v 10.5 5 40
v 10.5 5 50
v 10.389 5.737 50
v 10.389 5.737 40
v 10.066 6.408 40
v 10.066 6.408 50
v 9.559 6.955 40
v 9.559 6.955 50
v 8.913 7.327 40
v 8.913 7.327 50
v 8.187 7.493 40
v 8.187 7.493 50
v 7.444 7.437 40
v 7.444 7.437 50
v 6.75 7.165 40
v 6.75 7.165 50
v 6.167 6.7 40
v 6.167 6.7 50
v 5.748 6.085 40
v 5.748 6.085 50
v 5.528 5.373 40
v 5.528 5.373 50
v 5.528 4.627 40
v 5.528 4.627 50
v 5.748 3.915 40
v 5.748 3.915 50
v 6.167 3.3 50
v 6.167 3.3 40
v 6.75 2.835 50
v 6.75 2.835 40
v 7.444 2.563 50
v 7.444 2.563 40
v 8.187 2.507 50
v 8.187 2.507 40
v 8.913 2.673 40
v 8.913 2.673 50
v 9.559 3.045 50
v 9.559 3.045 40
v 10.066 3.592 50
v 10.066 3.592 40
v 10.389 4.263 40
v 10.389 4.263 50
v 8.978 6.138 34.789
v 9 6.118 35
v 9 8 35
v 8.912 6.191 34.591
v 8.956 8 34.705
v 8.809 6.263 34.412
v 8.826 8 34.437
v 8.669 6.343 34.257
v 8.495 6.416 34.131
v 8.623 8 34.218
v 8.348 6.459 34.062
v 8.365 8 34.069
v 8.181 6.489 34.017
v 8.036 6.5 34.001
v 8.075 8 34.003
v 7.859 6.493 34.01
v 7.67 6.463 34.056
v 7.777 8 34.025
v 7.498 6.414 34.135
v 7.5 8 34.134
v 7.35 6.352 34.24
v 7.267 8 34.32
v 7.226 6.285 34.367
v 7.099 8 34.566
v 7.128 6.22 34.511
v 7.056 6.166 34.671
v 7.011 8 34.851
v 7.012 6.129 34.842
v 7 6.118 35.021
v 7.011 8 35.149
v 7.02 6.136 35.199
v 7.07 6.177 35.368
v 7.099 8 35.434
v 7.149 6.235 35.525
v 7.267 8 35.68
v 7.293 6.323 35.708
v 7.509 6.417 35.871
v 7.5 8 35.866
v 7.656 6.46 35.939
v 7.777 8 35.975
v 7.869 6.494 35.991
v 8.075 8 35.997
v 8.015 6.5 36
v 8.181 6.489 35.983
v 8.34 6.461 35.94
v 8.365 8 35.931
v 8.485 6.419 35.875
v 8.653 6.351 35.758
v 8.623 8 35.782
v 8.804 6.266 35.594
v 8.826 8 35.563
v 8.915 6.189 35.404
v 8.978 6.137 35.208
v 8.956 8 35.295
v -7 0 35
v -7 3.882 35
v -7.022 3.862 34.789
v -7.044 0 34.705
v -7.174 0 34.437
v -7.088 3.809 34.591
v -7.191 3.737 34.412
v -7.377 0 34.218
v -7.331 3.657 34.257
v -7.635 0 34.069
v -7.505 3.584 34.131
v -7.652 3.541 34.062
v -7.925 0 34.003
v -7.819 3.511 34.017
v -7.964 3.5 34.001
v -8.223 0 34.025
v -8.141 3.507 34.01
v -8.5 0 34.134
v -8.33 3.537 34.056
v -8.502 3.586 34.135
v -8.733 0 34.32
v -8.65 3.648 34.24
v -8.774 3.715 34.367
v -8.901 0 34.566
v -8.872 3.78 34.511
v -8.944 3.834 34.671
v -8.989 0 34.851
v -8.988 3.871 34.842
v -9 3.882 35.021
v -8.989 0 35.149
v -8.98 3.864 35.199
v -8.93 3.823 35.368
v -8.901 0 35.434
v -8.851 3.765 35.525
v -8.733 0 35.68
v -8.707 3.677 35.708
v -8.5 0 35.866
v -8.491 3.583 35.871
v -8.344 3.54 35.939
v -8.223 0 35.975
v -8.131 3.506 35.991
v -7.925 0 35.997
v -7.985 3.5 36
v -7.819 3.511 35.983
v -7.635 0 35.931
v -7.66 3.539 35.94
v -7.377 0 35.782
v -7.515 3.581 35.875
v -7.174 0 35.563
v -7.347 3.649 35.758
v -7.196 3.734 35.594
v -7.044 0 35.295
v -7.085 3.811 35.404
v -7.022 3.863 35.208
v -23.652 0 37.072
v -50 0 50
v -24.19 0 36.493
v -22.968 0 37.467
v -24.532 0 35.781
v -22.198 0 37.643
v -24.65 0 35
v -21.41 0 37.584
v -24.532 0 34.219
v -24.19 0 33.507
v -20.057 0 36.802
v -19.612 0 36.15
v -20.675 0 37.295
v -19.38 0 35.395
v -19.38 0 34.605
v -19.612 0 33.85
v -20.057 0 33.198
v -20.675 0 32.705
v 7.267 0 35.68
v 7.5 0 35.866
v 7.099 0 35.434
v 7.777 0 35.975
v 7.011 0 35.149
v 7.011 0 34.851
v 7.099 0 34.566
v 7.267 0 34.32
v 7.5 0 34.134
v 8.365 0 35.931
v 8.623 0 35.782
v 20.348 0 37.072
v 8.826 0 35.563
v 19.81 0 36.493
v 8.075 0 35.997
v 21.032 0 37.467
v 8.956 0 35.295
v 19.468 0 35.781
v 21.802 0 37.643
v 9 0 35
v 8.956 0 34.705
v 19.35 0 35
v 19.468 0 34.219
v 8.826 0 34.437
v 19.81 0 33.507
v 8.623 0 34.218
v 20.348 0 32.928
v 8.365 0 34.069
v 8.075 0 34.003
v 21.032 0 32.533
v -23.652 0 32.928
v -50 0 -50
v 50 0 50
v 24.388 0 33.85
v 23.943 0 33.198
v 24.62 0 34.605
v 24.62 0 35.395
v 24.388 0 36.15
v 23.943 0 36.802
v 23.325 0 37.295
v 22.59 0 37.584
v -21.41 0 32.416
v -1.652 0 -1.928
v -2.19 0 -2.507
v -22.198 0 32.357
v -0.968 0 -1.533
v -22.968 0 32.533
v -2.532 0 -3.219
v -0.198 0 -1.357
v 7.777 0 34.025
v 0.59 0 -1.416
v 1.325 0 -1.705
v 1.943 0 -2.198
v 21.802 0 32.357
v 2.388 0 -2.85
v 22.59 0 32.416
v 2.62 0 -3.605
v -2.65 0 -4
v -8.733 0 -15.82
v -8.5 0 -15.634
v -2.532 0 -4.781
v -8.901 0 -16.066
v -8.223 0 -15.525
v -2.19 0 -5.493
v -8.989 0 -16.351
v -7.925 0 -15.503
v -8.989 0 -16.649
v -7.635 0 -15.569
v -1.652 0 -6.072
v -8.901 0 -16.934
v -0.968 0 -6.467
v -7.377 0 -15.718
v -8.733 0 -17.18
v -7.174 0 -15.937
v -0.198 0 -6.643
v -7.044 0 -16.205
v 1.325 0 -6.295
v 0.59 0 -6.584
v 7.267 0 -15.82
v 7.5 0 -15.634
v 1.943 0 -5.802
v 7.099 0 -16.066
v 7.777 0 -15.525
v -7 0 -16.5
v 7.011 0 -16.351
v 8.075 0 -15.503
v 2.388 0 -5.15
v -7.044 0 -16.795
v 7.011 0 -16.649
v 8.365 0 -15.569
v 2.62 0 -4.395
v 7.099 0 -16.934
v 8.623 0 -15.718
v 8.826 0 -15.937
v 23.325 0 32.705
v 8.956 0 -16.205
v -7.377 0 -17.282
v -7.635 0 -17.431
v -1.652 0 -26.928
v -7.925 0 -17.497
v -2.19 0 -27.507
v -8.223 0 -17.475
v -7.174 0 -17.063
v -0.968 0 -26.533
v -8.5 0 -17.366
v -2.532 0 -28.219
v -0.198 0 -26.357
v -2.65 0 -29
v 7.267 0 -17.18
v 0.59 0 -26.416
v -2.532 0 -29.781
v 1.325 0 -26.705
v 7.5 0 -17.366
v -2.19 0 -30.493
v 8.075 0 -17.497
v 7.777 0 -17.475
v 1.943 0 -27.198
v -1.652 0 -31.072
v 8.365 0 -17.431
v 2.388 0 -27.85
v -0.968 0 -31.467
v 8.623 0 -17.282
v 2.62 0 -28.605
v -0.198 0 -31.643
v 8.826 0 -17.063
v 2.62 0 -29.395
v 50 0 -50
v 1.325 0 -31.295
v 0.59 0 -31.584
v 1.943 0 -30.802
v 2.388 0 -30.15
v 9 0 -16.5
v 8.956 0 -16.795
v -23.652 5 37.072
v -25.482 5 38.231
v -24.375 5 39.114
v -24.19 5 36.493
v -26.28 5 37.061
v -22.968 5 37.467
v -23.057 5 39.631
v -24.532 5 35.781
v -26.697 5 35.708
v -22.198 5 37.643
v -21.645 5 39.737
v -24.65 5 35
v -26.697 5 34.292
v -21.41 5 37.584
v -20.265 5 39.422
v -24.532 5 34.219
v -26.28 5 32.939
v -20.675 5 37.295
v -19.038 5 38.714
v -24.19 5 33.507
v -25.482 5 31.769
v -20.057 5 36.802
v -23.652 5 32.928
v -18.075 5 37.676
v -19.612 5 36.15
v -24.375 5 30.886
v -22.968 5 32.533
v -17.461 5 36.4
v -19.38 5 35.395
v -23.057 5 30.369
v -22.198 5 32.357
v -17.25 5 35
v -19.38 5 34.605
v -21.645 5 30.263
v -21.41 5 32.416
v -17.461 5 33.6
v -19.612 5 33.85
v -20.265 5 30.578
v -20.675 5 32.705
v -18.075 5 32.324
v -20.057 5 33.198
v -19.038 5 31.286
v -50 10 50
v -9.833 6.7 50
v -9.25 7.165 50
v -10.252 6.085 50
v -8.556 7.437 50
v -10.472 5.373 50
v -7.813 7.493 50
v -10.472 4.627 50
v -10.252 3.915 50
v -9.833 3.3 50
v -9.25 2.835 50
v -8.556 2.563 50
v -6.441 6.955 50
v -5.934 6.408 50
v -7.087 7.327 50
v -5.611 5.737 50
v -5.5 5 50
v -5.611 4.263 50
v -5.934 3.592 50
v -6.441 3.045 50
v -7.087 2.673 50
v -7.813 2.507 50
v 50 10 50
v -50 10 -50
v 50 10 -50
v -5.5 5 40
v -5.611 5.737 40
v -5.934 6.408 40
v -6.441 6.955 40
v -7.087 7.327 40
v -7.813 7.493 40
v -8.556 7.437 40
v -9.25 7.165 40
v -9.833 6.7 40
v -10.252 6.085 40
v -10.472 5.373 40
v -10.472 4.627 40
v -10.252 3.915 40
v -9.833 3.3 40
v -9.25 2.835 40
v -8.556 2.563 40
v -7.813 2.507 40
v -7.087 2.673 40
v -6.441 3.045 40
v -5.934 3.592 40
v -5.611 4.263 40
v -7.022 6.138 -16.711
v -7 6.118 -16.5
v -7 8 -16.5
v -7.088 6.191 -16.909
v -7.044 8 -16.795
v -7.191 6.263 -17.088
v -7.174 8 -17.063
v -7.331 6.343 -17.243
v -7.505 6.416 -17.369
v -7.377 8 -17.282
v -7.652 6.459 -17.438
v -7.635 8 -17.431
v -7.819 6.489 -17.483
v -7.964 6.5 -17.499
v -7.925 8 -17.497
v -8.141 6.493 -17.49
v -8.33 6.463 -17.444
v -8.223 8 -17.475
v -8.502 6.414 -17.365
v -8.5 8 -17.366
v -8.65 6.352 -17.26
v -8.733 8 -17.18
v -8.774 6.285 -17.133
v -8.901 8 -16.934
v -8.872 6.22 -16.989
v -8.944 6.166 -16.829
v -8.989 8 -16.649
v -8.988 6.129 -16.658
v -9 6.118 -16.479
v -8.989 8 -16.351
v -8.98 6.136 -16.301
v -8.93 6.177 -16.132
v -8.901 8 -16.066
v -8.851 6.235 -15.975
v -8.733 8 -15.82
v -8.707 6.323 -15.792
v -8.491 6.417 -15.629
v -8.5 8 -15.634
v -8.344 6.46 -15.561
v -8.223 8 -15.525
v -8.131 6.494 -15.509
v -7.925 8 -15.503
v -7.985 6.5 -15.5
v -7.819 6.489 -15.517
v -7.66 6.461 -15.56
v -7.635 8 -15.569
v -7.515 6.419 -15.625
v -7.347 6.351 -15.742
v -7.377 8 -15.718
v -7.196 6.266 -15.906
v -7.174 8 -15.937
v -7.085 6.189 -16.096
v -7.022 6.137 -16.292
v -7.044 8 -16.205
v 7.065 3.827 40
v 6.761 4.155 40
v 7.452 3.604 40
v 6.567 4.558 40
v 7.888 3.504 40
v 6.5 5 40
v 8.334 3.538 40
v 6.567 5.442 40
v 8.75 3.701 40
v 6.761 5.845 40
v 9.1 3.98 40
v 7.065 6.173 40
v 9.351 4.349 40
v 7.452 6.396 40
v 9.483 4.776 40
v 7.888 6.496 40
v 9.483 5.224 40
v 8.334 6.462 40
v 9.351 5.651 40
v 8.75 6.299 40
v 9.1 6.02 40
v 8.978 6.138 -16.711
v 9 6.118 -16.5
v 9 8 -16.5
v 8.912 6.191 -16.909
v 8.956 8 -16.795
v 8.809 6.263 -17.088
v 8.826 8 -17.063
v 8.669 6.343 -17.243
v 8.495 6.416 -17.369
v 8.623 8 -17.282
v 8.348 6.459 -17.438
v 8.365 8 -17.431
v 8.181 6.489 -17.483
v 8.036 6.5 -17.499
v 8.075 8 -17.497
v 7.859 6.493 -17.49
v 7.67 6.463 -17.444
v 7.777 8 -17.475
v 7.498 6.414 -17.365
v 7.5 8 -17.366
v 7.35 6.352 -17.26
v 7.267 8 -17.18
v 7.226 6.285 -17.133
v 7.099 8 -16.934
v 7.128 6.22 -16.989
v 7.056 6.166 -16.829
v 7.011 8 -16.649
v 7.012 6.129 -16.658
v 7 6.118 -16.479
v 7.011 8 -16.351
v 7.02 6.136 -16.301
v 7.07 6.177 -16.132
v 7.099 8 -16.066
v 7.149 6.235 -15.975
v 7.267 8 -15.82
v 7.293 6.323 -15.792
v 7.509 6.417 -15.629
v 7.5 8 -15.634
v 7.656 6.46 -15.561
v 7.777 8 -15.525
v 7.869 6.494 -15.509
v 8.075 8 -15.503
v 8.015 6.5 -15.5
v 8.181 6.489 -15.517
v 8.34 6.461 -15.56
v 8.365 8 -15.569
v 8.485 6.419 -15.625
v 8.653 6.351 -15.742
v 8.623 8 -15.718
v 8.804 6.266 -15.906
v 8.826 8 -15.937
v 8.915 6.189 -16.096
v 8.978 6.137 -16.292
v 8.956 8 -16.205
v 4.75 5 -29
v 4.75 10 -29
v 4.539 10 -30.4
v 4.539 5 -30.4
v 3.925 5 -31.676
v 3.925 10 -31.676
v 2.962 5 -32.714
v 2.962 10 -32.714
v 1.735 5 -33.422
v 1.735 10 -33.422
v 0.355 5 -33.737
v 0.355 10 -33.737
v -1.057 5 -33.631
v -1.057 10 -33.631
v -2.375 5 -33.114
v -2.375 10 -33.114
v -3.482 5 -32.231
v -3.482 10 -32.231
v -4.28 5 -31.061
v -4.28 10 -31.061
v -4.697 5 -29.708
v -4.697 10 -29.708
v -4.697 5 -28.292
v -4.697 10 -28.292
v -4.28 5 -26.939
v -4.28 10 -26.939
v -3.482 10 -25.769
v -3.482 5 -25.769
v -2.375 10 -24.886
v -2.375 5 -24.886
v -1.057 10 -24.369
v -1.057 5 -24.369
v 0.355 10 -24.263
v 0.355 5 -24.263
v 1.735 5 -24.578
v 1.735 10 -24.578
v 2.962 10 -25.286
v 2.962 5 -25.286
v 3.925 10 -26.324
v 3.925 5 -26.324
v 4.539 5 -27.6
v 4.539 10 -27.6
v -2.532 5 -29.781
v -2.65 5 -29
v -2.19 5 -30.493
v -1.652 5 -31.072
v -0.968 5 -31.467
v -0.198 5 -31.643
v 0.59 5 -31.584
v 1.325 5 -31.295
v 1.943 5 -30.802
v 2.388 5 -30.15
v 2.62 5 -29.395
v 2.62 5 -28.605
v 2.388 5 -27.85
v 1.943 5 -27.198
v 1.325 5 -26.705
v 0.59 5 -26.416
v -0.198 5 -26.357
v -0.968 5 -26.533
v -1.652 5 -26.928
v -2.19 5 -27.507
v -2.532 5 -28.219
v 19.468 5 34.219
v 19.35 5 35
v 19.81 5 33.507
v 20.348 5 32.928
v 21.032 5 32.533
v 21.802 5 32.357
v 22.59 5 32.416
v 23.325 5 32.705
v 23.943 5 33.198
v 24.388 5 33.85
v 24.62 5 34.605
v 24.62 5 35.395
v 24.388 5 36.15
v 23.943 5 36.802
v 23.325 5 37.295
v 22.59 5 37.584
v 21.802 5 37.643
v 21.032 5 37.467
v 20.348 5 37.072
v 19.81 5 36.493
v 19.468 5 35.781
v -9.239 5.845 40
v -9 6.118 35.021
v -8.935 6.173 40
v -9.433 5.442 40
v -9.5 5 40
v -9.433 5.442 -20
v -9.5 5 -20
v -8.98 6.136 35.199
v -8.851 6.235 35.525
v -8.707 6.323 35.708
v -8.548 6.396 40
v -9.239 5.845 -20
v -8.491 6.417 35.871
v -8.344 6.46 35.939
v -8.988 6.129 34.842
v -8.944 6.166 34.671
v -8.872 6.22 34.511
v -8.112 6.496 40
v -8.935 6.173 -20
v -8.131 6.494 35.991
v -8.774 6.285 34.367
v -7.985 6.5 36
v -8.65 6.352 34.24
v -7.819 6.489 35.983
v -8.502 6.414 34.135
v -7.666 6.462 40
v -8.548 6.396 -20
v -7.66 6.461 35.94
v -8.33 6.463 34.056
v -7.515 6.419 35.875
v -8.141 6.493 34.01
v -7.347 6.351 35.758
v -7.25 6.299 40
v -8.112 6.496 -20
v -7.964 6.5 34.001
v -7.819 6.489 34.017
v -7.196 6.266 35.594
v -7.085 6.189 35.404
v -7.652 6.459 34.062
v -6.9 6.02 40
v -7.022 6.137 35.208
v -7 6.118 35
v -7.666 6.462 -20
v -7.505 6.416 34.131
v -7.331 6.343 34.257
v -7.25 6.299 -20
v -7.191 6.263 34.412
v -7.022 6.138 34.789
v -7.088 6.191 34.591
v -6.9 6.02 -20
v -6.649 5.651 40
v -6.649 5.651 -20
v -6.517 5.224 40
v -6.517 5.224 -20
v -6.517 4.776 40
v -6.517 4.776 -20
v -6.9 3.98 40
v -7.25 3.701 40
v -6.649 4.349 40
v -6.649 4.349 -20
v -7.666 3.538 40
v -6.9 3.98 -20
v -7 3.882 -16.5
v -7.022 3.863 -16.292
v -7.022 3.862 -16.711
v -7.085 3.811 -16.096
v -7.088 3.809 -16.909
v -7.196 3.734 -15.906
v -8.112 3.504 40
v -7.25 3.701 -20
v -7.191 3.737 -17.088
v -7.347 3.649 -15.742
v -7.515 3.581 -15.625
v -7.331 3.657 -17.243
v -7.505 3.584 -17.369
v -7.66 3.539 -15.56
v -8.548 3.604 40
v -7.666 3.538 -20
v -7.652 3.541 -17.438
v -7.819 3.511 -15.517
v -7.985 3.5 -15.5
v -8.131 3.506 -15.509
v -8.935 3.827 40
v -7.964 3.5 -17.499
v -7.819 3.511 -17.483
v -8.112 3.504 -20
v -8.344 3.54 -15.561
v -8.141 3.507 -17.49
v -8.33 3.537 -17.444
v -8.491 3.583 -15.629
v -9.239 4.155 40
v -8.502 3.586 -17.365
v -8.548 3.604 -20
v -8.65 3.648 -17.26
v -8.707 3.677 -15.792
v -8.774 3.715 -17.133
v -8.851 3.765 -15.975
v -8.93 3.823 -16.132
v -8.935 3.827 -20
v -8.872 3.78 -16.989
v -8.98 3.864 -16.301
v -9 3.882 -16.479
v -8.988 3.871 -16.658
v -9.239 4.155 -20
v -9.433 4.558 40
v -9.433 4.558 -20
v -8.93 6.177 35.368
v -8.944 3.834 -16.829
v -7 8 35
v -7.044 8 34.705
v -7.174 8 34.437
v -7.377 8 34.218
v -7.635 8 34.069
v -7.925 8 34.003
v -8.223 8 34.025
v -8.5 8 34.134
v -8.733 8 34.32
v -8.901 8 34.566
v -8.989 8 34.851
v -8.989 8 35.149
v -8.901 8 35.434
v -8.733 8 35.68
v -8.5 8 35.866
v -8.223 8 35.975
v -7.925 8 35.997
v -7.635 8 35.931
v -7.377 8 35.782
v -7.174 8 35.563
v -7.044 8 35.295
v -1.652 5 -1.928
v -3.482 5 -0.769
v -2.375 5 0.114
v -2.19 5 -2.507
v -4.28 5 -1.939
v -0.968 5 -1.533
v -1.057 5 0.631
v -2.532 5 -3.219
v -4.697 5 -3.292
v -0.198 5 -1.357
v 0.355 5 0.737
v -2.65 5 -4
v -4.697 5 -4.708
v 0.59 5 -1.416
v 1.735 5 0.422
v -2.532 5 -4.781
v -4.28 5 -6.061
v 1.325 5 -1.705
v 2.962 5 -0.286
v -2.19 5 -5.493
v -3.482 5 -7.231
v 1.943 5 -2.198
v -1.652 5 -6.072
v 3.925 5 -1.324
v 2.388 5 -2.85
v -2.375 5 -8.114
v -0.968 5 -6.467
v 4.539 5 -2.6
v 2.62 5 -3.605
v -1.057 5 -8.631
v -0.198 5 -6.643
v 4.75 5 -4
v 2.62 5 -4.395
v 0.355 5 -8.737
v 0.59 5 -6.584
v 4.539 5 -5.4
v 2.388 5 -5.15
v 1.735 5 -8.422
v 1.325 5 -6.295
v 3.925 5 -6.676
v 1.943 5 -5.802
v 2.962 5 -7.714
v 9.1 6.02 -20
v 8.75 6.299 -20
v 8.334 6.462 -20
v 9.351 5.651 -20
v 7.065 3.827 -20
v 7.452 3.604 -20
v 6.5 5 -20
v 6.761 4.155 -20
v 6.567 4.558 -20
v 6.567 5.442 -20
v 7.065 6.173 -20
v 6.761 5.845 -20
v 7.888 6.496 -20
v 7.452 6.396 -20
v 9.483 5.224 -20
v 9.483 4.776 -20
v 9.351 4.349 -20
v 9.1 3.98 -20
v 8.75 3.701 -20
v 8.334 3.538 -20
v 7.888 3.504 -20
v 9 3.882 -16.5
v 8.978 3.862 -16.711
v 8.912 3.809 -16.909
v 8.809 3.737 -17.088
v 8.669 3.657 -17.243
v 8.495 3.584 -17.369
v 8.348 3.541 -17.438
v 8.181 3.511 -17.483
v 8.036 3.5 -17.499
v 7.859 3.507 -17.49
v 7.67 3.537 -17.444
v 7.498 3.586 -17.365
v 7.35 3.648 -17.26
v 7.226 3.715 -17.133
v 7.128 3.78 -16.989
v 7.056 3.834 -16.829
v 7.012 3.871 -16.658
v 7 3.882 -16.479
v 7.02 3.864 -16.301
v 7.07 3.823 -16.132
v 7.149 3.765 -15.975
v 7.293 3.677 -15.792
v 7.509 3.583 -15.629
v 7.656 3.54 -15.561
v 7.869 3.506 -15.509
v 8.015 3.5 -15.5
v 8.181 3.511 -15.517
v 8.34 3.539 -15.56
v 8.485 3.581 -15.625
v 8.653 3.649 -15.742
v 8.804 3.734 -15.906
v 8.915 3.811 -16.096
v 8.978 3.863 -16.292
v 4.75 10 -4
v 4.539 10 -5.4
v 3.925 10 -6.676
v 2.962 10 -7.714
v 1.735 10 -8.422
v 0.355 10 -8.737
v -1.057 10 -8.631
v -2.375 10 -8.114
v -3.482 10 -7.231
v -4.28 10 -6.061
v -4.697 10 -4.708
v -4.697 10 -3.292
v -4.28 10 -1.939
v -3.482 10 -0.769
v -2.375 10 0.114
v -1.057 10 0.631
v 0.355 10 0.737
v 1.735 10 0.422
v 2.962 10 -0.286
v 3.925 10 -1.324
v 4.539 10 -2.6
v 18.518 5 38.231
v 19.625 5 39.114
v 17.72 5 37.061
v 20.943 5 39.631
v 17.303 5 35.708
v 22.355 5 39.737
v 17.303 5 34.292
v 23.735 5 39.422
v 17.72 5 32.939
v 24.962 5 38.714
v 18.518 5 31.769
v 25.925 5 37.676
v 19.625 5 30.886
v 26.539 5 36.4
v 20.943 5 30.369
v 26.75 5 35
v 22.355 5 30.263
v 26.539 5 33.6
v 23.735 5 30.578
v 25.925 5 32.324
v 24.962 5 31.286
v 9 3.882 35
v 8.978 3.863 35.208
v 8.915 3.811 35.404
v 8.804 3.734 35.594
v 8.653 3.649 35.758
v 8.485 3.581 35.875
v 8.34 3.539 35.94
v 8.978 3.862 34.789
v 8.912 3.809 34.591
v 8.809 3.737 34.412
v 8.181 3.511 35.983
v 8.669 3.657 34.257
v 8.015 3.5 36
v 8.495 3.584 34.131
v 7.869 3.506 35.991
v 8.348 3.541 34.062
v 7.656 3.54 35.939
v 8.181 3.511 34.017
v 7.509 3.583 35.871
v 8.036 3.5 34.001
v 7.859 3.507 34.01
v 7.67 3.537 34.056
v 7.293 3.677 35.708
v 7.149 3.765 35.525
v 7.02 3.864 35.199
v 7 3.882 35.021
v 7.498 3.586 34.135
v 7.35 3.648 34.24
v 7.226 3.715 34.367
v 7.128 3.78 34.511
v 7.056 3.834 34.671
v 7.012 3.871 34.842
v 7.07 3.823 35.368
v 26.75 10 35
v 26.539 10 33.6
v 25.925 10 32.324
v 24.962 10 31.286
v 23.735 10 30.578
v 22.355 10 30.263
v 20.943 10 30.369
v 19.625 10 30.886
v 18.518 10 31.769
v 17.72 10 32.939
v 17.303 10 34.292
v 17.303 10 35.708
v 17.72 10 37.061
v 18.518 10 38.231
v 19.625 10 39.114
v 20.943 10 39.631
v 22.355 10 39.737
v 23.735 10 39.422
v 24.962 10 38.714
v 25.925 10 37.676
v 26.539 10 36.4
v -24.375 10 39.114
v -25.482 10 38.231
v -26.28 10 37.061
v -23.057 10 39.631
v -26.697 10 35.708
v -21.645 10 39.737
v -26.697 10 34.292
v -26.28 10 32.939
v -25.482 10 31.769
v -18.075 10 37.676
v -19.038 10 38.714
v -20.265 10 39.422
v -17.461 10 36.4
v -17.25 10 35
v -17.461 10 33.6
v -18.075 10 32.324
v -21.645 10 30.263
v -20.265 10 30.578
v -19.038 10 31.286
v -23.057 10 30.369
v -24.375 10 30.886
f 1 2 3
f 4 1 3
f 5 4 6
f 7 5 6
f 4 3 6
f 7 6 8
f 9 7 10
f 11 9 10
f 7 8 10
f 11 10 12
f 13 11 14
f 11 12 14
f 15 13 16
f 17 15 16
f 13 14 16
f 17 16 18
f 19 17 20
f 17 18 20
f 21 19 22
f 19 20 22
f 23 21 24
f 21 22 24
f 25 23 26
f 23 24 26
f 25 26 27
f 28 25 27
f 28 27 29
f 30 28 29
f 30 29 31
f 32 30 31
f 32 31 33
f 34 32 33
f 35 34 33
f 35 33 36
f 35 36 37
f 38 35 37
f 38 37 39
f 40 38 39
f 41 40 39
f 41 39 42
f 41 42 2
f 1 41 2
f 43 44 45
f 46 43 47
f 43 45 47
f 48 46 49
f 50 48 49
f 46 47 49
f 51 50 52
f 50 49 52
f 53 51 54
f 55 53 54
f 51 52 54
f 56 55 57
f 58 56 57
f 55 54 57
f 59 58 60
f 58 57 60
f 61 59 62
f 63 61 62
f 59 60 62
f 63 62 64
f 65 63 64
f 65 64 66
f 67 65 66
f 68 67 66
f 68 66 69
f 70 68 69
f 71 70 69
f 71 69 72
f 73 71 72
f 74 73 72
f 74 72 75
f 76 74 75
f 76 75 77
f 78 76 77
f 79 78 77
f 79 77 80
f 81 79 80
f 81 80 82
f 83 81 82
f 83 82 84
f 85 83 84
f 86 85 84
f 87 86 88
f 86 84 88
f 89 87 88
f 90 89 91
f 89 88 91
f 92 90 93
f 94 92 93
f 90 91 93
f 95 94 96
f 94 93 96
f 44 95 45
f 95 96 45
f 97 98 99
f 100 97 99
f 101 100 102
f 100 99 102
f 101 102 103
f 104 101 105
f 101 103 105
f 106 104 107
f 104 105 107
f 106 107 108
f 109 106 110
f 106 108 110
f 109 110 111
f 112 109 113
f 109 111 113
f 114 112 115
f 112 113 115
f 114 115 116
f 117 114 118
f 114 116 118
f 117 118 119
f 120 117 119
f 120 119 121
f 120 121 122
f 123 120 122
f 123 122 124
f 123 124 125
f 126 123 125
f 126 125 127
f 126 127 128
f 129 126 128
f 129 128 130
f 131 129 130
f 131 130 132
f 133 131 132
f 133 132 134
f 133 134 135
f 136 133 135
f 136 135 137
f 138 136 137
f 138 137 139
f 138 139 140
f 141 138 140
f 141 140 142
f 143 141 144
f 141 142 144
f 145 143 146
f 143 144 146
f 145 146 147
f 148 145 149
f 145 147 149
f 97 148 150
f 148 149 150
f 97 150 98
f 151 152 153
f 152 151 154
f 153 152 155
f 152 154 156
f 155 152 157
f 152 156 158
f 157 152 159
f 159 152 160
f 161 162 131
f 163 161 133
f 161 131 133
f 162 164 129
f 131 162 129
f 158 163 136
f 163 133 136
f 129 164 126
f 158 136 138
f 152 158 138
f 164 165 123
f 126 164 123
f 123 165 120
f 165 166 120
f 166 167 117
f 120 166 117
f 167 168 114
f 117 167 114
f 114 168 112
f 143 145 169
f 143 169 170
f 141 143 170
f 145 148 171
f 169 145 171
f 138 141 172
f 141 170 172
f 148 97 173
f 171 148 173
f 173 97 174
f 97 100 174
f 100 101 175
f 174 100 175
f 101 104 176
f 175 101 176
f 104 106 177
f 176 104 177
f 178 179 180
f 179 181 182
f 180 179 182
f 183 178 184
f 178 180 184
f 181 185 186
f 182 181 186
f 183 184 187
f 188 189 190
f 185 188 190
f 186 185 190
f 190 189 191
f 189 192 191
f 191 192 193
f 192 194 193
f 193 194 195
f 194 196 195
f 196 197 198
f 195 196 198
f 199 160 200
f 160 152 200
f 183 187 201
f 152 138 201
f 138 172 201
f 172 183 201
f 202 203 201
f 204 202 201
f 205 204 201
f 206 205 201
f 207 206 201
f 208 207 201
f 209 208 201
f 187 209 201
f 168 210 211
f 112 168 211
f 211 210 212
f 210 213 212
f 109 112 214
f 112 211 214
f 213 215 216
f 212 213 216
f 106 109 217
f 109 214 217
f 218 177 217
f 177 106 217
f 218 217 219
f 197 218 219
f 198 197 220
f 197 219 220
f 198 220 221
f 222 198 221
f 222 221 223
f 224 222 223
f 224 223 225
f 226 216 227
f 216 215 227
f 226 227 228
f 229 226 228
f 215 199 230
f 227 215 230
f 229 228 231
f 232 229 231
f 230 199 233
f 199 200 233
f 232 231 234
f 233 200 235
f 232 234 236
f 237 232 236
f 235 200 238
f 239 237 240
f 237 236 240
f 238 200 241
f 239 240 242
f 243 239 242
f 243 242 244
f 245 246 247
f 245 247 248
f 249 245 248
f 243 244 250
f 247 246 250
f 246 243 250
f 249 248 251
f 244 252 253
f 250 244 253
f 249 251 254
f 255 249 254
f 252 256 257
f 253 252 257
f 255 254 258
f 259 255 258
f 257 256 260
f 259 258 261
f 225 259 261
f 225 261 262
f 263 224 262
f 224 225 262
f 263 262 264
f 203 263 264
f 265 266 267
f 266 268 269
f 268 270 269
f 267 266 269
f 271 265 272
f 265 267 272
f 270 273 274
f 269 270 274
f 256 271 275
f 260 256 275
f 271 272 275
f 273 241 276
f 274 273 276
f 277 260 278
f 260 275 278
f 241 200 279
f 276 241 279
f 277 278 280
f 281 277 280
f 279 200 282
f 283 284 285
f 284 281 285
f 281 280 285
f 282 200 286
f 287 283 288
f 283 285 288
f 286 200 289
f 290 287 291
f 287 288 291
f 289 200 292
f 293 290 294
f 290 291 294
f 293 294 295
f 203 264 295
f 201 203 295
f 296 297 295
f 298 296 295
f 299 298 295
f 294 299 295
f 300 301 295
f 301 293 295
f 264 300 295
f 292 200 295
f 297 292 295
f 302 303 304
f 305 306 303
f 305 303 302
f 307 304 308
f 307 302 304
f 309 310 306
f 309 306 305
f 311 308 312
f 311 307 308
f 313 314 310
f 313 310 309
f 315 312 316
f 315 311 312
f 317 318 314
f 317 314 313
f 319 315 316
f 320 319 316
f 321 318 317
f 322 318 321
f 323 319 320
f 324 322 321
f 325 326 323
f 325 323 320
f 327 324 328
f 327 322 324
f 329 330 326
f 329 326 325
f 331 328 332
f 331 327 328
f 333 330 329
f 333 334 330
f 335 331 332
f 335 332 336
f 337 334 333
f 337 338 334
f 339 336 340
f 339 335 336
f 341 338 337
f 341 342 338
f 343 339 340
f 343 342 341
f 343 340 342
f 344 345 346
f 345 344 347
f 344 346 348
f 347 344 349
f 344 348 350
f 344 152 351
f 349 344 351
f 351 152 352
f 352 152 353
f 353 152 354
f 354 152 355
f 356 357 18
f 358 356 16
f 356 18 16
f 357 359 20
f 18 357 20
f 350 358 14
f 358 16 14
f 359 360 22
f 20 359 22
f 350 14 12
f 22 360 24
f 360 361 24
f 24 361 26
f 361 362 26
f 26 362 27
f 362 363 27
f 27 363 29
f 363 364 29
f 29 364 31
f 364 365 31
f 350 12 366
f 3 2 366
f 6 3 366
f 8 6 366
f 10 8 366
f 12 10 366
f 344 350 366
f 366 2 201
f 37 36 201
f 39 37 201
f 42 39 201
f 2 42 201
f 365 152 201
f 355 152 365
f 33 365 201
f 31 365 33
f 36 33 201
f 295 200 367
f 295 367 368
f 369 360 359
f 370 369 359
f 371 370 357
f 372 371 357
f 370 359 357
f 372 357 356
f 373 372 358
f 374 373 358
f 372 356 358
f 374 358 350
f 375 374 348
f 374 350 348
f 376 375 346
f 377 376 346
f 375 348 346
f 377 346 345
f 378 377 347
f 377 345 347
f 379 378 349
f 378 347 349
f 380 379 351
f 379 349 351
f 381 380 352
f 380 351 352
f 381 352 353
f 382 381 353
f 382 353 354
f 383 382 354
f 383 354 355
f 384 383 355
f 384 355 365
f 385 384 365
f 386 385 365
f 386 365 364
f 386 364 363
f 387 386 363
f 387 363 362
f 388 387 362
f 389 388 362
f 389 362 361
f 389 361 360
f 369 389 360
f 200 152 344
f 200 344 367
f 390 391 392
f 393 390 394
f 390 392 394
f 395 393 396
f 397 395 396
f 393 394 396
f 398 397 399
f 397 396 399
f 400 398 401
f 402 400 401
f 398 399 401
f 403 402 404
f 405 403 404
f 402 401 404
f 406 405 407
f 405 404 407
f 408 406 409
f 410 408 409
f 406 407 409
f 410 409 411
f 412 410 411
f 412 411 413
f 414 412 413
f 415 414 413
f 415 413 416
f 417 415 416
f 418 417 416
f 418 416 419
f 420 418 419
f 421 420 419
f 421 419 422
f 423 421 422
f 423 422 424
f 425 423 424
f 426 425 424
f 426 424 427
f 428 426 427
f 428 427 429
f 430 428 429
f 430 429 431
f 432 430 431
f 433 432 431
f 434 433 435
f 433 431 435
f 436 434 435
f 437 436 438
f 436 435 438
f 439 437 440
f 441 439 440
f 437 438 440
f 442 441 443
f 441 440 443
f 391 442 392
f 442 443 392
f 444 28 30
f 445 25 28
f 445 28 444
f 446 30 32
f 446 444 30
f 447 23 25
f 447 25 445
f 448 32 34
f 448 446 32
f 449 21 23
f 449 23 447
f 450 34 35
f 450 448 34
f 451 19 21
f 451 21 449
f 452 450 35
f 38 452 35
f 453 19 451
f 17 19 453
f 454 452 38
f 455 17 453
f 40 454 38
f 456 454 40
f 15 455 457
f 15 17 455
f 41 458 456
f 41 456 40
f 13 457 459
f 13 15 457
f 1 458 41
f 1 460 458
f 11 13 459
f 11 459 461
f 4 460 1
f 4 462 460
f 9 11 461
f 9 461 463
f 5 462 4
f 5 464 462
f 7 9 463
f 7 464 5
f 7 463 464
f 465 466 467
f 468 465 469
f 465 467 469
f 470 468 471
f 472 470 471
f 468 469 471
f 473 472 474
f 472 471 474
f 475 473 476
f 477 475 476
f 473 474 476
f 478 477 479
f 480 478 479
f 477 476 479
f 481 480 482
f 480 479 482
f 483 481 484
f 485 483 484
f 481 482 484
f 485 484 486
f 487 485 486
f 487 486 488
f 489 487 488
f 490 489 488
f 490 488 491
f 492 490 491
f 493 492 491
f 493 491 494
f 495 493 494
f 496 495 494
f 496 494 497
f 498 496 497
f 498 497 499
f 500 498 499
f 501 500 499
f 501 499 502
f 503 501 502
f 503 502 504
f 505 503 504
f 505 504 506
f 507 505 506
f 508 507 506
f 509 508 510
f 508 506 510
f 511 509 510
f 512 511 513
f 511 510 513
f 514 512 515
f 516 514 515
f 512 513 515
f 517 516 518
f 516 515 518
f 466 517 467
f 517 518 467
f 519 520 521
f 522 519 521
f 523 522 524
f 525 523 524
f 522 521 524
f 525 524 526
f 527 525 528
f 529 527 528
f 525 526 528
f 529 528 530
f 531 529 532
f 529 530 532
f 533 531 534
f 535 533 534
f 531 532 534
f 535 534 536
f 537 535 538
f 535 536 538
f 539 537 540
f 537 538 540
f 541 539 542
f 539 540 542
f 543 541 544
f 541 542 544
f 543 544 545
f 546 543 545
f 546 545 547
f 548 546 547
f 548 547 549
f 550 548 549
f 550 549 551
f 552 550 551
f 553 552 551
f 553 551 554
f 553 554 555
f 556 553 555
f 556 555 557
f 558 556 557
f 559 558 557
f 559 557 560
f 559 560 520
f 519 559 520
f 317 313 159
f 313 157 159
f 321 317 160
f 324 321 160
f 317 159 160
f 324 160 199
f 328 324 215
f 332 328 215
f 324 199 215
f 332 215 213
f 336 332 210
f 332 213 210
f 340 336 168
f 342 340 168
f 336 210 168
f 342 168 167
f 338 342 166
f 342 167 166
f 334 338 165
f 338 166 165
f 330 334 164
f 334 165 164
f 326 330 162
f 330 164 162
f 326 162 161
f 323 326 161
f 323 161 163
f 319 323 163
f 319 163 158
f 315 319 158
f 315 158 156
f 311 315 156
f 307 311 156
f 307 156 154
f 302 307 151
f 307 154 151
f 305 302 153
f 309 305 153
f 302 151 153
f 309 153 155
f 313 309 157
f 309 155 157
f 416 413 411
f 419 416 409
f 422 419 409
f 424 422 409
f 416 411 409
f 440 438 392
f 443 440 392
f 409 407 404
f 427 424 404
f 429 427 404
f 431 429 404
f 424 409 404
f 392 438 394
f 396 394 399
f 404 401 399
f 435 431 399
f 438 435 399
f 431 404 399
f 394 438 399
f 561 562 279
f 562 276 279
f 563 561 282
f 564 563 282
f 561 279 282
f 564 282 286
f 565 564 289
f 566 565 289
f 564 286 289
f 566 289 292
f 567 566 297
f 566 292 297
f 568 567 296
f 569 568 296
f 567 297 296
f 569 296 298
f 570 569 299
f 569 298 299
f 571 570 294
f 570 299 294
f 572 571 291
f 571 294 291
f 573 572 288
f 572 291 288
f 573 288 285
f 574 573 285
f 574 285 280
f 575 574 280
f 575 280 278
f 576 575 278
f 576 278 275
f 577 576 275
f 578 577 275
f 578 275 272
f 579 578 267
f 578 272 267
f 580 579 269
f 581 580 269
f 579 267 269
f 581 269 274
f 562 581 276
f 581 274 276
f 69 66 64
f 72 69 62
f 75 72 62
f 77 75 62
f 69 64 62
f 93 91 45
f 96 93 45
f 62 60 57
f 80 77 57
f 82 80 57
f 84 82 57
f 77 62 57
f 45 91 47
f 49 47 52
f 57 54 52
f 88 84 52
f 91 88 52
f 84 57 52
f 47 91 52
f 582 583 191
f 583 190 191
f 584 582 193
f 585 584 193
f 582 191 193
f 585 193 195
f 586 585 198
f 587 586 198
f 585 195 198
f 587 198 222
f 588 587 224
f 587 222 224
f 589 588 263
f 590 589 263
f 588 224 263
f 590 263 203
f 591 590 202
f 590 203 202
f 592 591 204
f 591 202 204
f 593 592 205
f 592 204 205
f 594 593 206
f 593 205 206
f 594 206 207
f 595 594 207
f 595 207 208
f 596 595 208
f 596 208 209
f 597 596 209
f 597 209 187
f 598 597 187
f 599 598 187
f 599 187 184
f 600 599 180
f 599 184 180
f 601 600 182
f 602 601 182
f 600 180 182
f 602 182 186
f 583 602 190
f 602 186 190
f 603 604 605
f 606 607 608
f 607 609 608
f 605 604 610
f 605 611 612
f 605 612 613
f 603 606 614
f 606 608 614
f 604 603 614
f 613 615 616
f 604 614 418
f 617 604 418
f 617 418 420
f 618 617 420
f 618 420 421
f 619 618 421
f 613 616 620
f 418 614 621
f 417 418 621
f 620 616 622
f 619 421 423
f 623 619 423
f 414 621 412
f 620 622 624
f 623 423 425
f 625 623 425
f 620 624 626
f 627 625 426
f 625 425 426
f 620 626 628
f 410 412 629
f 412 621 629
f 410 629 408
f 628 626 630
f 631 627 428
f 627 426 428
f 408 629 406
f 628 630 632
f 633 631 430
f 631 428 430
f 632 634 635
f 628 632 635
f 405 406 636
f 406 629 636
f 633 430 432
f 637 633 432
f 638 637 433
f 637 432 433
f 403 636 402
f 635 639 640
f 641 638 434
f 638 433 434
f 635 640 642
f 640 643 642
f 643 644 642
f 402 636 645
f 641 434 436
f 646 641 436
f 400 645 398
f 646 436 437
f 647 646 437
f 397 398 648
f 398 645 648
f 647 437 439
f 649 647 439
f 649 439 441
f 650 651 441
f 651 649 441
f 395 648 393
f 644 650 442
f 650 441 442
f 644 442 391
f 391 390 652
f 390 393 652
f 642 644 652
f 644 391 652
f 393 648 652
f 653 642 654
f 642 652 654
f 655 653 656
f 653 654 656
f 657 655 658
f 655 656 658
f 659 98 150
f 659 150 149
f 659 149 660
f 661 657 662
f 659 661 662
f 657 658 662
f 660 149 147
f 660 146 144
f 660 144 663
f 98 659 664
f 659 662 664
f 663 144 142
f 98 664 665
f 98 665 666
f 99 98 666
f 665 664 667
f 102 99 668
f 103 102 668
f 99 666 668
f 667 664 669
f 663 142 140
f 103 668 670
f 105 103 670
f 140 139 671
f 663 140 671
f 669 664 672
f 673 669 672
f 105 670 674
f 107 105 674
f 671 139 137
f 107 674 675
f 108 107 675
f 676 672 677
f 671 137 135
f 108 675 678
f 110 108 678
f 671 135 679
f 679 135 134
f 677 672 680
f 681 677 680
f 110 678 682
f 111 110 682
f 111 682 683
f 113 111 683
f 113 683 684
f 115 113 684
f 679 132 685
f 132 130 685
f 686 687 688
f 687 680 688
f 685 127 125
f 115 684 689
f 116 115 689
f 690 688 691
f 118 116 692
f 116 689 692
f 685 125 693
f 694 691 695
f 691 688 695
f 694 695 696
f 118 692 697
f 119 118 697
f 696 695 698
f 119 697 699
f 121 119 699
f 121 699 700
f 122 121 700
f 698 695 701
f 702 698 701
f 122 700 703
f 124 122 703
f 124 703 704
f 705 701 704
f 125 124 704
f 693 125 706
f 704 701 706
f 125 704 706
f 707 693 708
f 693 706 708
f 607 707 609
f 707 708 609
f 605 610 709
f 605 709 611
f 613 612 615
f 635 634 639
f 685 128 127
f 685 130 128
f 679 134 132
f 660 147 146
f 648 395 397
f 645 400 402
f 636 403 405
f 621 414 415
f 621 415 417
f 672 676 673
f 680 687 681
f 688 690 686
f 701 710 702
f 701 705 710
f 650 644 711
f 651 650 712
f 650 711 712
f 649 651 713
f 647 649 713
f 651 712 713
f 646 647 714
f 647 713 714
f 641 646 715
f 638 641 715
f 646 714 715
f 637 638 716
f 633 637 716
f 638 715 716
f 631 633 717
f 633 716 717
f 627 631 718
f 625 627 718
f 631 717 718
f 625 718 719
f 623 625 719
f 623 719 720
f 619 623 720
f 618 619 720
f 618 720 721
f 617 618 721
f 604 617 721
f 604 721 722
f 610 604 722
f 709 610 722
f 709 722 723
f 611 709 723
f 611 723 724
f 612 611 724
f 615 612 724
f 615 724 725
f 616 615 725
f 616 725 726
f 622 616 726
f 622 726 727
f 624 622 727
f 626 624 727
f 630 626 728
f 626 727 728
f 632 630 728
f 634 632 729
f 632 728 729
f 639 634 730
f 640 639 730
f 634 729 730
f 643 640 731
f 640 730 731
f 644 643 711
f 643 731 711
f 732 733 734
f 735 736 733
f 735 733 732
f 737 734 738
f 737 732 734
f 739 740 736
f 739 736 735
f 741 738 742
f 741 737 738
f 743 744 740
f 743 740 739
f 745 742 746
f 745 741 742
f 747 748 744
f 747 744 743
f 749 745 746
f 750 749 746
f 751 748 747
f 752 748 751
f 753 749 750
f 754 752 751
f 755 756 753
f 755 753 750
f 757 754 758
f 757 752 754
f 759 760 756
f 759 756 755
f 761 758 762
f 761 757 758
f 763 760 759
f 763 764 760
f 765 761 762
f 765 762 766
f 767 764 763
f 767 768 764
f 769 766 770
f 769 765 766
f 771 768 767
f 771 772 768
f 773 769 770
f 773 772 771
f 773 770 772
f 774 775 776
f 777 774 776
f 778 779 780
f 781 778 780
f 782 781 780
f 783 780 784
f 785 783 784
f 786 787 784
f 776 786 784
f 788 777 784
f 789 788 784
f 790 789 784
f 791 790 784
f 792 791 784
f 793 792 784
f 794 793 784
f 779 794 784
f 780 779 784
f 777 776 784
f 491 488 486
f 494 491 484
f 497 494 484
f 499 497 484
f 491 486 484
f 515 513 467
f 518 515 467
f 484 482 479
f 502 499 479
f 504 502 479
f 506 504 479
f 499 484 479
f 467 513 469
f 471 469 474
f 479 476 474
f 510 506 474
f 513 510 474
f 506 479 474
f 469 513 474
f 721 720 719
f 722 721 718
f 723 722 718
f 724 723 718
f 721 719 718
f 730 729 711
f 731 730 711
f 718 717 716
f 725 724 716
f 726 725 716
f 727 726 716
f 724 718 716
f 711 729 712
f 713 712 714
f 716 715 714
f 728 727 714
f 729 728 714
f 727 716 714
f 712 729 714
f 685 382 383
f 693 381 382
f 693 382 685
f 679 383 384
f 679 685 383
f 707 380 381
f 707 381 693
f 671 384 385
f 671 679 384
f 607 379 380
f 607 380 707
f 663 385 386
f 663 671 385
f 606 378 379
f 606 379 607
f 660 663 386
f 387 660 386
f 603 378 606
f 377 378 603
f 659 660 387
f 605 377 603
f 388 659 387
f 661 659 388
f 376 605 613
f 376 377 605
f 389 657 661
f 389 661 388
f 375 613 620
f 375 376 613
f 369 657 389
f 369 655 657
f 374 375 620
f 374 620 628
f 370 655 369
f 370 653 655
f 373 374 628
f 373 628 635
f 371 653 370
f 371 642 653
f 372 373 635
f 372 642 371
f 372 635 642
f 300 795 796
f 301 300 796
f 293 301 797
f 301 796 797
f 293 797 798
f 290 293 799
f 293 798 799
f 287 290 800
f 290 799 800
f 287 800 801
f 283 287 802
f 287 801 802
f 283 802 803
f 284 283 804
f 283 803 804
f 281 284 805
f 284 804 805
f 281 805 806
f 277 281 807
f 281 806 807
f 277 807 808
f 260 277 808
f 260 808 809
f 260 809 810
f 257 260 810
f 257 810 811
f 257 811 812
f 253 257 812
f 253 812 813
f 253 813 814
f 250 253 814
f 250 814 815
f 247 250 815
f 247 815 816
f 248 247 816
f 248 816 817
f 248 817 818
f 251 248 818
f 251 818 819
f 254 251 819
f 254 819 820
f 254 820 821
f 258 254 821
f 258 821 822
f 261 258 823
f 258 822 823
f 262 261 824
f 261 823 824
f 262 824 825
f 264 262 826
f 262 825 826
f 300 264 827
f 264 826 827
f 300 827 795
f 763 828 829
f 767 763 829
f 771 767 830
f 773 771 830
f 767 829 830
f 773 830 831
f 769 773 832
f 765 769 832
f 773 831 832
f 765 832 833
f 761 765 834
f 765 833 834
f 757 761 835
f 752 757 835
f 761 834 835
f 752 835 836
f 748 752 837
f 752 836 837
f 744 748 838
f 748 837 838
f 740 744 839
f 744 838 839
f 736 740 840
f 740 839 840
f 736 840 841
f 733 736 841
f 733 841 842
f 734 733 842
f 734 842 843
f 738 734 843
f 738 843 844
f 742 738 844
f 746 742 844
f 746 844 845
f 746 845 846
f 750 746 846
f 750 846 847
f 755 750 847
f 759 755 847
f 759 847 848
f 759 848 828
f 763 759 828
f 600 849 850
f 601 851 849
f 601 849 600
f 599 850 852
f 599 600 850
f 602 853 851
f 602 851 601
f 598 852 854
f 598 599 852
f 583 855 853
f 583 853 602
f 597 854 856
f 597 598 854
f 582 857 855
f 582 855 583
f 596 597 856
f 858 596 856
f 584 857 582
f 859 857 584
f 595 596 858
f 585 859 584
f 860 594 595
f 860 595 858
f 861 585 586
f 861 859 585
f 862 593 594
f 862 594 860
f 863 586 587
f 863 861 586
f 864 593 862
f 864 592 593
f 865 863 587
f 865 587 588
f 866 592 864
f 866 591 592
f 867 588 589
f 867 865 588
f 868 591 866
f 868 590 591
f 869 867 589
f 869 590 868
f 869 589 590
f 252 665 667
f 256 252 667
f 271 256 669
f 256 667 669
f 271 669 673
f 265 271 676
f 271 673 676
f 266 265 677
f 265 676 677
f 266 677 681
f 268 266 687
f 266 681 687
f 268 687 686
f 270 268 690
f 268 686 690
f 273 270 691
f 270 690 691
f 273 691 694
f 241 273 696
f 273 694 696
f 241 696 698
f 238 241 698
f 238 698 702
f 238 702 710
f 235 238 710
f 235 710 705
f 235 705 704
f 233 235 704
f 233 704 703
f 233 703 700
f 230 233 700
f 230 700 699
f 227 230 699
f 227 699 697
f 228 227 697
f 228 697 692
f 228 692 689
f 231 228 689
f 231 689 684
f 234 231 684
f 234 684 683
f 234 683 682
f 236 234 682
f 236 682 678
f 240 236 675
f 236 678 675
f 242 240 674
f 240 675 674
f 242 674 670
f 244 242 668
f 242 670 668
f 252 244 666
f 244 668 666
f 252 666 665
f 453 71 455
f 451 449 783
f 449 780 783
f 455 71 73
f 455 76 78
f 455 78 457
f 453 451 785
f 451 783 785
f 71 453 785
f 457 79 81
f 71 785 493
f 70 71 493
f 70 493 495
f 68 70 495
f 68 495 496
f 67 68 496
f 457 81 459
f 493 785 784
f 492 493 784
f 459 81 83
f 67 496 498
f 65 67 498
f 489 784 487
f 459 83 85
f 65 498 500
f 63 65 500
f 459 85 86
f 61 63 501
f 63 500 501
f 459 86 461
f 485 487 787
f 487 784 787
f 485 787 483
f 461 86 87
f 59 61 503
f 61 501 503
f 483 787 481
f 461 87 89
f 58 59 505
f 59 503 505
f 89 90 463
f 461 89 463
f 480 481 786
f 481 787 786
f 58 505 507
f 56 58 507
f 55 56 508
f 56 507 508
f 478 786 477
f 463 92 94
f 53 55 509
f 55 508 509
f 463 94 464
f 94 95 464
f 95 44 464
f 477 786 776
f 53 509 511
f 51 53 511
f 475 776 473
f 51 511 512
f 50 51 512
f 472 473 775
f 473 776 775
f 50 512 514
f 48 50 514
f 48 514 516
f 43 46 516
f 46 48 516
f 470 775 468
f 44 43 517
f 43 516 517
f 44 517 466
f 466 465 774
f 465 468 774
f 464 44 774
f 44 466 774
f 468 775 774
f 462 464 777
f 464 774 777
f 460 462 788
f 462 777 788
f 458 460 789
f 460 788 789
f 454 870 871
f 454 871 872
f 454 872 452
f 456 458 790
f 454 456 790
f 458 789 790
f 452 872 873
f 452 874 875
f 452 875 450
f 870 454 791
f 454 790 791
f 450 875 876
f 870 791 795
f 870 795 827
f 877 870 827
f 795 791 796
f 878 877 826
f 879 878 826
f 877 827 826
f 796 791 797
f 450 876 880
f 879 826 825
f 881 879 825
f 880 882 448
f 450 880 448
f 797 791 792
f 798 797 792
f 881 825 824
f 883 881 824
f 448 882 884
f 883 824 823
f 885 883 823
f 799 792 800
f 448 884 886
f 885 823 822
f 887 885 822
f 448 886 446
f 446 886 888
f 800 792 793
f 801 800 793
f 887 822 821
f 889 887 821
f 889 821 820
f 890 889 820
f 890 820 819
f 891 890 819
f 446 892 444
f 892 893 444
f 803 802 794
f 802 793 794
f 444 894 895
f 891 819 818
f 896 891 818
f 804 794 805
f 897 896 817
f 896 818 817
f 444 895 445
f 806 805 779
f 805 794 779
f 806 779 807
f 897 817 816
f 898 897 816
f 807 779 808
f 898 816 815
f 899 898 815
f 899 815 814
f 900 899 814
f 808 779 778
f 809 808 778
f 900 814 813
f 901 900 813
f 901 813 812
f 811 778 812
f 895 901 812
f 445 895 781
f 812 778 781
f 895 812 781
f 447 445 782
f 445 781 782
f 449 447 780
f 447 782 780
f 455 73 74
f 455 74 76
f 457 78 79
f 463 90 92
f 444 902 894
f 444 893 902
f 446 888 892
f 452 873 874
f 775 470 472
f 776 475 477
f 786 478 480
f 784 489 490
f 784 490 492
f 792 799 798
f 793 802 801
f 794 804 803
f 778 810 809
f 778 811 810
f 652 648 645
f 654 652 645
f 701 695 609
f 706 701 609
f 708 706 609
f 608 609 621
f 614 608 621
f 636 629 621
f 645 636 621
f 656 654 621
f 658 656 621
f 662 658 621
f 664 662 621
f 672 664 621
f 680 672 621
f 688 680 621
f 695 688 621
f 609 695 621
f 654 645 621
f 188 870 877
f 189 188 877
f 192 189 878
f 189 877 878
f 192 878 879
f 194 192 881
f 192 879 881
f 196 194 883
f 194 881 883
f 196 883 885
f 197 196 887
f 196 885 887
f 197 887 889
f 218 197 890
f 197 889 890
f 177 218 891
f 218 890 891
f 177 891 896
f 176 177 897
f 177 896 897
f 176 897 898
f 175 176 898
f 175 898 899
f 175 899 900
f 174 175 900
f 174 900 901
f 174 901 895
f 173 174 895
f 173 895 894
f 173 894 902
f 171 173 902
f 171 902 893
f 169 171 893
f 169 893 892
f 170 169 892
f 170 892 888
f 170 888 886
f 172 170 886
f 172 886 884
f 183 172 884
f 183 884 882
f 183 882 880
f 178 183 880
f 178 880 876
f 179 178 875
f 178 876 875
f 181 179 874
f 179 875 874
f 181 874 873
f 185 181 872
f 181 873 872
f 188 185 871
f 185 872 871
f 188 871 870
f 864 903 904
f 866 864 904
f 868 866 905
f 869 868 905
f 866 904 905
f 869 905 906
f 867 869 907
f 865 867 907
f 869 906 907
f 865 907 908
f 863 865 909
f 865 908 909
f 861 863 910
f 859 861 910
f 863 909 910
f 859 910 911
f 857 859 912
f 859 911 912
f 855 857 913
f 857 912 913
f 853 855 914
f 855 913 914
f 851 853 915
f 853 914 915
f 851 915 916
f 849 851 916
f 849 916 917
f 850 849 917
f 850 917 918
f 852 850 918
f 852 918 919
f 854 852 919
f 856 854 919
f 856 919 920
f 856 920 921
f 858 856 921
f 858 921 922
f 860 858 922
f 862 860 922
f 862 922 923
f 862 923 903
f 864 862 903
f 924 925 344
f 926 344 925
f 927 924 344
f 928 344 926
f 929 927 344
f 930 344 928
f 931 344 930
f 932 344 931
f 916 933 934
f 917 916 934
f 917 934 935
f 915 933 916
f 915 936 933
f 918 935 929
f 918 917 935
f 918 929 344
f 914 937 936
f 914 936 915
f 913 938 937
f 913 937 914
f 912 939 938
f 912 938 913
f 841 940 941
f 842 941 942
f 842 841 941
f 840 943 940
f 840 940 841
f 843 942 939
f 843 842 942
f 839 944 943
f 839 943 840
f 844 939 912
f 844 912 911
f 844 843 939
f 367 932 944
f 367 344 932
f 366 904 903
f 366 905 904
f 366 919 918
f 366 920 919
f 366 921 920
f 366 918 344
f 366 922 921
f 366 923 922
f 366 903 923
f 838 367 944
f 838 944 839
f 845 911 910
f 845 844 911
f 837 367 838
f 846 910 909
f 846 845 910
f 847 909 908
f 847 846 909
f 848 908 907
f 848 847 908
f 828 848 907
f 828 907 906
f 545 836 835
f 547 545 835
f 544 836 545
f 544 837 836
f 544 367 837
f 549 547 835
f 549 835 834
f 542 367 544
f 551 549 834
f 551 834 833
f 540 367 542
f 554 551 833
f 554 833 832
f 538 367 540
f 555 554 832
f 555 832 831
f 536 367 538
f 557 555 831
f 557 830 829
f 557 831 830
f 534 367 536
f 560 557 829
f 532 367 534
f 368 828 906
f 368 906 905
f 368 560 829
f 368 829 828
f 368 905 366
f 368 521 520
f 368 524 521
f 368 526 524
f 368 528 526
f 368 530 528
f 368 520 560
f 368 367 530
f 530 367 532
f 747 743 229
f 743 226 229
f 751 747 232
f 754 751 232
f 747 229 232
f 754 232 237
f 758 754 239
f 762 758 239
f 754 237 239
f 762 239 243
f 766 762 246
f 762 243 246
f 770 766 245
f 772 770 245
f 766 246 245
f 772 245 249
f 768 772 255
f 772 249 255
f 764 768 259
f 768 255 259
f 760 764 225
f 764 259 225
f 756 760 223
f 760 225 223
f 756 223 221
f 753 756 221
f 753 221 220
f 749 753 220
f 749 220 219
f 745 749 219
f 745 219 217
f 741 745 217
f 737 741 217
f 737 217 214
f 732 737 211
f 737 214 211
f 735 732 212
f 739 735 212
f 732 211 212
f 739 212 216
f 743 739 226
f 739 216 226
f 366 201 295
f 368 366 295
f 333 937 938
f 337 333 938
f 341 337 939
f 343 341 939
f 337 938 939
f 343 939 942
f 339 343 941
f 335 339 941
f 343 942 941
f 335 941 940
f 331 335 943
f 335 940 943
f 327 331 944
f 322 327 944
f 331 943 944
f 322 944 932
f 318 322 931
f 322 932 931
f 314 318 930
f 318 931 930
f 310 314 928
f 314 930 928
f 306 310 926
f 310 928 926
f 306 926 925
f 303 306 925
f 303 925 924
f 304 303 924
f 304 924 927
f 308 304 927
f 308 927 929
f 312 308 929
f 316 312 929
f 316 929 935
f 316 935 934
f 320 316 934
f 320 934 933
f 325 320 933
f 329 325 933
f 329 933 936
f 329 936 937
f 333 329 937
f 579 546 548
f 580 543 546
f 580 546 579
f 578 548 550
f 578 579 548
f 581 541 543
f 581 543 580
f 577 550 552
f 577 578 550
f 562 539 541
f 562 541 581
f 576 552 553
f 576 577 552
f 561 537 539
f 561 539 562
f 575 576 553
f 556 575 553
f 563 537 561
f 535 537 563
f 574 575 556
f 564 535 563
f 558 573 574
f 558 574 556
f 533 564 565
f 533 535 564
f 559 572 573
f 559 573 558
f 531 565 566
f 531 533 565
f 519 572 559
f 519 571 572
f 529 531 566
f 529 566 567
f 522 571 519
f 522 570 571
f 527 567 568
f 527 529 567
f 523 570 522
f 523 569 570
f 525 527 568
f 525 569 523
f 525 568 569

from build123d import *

# Parameters (mm, degrees)
SKETCH_1_W                   = 100
SKETCH_1_H                   = 100
EXTRUDE_1_DEPTH              = 10
HOLE_WIZARD_M2_1_D           = 3
HOLE_WIZARD_M2_1_DEPTH       = 70
HOLE_WIZARD_M2_1_CBORE_D     = 5
HOLE_WIZARD_M2_1_CBORE_DEPTH = 10
HOLE_WIZARD_M5_1_D           = 5.3
HOLE_WIZARD_M5_1_CBORE_D     = 9.5
HOLE_WIZARD_M5_1_CBORE_DEPTH = 5
HOLE_WIZARD_M2_2_D           = 2
HOLE_WIZARD_M2_2_DEPTH       = 8


with BuildPart() as part:
    # 스케치1 → 보스-돌출1 (new body)
    with BuildSketch(Plane(origin=(0, 0, 0), x_dir=(1, 0, 0), z_dir=(0, 1, 0))):
        Rectangle(SKETCH_1_W, SKETCH_1_H)
    extrude(amount=EXTRUDE_1_DEPTH)

    # M2 소켓 머리 캡 나사용 카운터보어1
    with Locations(Plane.XY.offset(50)):
        with Locations((-8, 5), (8, 5)):
            CounterBoreHole(HOLE_WIZARD_M2_1_D / 2, HOLE_WIZARD_M2_1_CBORE_D / 2, HOLE_WIZARD_M2_1_CBORE_DEPTH, depth=HOLE_WIZARD_M2_1_DEPTH)

    # M5 소켓 머리 캡 나사용 카운터보어1 (through all)
    with Locations(Plane(origin=(0, 10, 0), x_dir=(1, 0, 0), z_dir=(0, 1, 0))):
        with Locations((0, 29), (0, 4), (-22, -35), (22, -35)):
            CounterBoreHole(HOLE_WIZARD_M5_1_D / 2, HOLE_WIZARD_M5_1_CBORE_D / 2, HOLE_WIZARD_M5_1_CBORE_DEPTH)

    # M2 여유 구멍2
    with Locations(Plane(origin=(0, 0, 0), x_dir=(-1, 0, 0), z_dir=(0, -1, 0))):
        with Locations((-8, -35), (8, -35), (8, 16.5), (-8, 16.5)):
            Hole(HOLE_WIZARD_M2_2_D / 2, depth=HOLE_WIZARD_M2_2_DEPTH)


solid = part.part
